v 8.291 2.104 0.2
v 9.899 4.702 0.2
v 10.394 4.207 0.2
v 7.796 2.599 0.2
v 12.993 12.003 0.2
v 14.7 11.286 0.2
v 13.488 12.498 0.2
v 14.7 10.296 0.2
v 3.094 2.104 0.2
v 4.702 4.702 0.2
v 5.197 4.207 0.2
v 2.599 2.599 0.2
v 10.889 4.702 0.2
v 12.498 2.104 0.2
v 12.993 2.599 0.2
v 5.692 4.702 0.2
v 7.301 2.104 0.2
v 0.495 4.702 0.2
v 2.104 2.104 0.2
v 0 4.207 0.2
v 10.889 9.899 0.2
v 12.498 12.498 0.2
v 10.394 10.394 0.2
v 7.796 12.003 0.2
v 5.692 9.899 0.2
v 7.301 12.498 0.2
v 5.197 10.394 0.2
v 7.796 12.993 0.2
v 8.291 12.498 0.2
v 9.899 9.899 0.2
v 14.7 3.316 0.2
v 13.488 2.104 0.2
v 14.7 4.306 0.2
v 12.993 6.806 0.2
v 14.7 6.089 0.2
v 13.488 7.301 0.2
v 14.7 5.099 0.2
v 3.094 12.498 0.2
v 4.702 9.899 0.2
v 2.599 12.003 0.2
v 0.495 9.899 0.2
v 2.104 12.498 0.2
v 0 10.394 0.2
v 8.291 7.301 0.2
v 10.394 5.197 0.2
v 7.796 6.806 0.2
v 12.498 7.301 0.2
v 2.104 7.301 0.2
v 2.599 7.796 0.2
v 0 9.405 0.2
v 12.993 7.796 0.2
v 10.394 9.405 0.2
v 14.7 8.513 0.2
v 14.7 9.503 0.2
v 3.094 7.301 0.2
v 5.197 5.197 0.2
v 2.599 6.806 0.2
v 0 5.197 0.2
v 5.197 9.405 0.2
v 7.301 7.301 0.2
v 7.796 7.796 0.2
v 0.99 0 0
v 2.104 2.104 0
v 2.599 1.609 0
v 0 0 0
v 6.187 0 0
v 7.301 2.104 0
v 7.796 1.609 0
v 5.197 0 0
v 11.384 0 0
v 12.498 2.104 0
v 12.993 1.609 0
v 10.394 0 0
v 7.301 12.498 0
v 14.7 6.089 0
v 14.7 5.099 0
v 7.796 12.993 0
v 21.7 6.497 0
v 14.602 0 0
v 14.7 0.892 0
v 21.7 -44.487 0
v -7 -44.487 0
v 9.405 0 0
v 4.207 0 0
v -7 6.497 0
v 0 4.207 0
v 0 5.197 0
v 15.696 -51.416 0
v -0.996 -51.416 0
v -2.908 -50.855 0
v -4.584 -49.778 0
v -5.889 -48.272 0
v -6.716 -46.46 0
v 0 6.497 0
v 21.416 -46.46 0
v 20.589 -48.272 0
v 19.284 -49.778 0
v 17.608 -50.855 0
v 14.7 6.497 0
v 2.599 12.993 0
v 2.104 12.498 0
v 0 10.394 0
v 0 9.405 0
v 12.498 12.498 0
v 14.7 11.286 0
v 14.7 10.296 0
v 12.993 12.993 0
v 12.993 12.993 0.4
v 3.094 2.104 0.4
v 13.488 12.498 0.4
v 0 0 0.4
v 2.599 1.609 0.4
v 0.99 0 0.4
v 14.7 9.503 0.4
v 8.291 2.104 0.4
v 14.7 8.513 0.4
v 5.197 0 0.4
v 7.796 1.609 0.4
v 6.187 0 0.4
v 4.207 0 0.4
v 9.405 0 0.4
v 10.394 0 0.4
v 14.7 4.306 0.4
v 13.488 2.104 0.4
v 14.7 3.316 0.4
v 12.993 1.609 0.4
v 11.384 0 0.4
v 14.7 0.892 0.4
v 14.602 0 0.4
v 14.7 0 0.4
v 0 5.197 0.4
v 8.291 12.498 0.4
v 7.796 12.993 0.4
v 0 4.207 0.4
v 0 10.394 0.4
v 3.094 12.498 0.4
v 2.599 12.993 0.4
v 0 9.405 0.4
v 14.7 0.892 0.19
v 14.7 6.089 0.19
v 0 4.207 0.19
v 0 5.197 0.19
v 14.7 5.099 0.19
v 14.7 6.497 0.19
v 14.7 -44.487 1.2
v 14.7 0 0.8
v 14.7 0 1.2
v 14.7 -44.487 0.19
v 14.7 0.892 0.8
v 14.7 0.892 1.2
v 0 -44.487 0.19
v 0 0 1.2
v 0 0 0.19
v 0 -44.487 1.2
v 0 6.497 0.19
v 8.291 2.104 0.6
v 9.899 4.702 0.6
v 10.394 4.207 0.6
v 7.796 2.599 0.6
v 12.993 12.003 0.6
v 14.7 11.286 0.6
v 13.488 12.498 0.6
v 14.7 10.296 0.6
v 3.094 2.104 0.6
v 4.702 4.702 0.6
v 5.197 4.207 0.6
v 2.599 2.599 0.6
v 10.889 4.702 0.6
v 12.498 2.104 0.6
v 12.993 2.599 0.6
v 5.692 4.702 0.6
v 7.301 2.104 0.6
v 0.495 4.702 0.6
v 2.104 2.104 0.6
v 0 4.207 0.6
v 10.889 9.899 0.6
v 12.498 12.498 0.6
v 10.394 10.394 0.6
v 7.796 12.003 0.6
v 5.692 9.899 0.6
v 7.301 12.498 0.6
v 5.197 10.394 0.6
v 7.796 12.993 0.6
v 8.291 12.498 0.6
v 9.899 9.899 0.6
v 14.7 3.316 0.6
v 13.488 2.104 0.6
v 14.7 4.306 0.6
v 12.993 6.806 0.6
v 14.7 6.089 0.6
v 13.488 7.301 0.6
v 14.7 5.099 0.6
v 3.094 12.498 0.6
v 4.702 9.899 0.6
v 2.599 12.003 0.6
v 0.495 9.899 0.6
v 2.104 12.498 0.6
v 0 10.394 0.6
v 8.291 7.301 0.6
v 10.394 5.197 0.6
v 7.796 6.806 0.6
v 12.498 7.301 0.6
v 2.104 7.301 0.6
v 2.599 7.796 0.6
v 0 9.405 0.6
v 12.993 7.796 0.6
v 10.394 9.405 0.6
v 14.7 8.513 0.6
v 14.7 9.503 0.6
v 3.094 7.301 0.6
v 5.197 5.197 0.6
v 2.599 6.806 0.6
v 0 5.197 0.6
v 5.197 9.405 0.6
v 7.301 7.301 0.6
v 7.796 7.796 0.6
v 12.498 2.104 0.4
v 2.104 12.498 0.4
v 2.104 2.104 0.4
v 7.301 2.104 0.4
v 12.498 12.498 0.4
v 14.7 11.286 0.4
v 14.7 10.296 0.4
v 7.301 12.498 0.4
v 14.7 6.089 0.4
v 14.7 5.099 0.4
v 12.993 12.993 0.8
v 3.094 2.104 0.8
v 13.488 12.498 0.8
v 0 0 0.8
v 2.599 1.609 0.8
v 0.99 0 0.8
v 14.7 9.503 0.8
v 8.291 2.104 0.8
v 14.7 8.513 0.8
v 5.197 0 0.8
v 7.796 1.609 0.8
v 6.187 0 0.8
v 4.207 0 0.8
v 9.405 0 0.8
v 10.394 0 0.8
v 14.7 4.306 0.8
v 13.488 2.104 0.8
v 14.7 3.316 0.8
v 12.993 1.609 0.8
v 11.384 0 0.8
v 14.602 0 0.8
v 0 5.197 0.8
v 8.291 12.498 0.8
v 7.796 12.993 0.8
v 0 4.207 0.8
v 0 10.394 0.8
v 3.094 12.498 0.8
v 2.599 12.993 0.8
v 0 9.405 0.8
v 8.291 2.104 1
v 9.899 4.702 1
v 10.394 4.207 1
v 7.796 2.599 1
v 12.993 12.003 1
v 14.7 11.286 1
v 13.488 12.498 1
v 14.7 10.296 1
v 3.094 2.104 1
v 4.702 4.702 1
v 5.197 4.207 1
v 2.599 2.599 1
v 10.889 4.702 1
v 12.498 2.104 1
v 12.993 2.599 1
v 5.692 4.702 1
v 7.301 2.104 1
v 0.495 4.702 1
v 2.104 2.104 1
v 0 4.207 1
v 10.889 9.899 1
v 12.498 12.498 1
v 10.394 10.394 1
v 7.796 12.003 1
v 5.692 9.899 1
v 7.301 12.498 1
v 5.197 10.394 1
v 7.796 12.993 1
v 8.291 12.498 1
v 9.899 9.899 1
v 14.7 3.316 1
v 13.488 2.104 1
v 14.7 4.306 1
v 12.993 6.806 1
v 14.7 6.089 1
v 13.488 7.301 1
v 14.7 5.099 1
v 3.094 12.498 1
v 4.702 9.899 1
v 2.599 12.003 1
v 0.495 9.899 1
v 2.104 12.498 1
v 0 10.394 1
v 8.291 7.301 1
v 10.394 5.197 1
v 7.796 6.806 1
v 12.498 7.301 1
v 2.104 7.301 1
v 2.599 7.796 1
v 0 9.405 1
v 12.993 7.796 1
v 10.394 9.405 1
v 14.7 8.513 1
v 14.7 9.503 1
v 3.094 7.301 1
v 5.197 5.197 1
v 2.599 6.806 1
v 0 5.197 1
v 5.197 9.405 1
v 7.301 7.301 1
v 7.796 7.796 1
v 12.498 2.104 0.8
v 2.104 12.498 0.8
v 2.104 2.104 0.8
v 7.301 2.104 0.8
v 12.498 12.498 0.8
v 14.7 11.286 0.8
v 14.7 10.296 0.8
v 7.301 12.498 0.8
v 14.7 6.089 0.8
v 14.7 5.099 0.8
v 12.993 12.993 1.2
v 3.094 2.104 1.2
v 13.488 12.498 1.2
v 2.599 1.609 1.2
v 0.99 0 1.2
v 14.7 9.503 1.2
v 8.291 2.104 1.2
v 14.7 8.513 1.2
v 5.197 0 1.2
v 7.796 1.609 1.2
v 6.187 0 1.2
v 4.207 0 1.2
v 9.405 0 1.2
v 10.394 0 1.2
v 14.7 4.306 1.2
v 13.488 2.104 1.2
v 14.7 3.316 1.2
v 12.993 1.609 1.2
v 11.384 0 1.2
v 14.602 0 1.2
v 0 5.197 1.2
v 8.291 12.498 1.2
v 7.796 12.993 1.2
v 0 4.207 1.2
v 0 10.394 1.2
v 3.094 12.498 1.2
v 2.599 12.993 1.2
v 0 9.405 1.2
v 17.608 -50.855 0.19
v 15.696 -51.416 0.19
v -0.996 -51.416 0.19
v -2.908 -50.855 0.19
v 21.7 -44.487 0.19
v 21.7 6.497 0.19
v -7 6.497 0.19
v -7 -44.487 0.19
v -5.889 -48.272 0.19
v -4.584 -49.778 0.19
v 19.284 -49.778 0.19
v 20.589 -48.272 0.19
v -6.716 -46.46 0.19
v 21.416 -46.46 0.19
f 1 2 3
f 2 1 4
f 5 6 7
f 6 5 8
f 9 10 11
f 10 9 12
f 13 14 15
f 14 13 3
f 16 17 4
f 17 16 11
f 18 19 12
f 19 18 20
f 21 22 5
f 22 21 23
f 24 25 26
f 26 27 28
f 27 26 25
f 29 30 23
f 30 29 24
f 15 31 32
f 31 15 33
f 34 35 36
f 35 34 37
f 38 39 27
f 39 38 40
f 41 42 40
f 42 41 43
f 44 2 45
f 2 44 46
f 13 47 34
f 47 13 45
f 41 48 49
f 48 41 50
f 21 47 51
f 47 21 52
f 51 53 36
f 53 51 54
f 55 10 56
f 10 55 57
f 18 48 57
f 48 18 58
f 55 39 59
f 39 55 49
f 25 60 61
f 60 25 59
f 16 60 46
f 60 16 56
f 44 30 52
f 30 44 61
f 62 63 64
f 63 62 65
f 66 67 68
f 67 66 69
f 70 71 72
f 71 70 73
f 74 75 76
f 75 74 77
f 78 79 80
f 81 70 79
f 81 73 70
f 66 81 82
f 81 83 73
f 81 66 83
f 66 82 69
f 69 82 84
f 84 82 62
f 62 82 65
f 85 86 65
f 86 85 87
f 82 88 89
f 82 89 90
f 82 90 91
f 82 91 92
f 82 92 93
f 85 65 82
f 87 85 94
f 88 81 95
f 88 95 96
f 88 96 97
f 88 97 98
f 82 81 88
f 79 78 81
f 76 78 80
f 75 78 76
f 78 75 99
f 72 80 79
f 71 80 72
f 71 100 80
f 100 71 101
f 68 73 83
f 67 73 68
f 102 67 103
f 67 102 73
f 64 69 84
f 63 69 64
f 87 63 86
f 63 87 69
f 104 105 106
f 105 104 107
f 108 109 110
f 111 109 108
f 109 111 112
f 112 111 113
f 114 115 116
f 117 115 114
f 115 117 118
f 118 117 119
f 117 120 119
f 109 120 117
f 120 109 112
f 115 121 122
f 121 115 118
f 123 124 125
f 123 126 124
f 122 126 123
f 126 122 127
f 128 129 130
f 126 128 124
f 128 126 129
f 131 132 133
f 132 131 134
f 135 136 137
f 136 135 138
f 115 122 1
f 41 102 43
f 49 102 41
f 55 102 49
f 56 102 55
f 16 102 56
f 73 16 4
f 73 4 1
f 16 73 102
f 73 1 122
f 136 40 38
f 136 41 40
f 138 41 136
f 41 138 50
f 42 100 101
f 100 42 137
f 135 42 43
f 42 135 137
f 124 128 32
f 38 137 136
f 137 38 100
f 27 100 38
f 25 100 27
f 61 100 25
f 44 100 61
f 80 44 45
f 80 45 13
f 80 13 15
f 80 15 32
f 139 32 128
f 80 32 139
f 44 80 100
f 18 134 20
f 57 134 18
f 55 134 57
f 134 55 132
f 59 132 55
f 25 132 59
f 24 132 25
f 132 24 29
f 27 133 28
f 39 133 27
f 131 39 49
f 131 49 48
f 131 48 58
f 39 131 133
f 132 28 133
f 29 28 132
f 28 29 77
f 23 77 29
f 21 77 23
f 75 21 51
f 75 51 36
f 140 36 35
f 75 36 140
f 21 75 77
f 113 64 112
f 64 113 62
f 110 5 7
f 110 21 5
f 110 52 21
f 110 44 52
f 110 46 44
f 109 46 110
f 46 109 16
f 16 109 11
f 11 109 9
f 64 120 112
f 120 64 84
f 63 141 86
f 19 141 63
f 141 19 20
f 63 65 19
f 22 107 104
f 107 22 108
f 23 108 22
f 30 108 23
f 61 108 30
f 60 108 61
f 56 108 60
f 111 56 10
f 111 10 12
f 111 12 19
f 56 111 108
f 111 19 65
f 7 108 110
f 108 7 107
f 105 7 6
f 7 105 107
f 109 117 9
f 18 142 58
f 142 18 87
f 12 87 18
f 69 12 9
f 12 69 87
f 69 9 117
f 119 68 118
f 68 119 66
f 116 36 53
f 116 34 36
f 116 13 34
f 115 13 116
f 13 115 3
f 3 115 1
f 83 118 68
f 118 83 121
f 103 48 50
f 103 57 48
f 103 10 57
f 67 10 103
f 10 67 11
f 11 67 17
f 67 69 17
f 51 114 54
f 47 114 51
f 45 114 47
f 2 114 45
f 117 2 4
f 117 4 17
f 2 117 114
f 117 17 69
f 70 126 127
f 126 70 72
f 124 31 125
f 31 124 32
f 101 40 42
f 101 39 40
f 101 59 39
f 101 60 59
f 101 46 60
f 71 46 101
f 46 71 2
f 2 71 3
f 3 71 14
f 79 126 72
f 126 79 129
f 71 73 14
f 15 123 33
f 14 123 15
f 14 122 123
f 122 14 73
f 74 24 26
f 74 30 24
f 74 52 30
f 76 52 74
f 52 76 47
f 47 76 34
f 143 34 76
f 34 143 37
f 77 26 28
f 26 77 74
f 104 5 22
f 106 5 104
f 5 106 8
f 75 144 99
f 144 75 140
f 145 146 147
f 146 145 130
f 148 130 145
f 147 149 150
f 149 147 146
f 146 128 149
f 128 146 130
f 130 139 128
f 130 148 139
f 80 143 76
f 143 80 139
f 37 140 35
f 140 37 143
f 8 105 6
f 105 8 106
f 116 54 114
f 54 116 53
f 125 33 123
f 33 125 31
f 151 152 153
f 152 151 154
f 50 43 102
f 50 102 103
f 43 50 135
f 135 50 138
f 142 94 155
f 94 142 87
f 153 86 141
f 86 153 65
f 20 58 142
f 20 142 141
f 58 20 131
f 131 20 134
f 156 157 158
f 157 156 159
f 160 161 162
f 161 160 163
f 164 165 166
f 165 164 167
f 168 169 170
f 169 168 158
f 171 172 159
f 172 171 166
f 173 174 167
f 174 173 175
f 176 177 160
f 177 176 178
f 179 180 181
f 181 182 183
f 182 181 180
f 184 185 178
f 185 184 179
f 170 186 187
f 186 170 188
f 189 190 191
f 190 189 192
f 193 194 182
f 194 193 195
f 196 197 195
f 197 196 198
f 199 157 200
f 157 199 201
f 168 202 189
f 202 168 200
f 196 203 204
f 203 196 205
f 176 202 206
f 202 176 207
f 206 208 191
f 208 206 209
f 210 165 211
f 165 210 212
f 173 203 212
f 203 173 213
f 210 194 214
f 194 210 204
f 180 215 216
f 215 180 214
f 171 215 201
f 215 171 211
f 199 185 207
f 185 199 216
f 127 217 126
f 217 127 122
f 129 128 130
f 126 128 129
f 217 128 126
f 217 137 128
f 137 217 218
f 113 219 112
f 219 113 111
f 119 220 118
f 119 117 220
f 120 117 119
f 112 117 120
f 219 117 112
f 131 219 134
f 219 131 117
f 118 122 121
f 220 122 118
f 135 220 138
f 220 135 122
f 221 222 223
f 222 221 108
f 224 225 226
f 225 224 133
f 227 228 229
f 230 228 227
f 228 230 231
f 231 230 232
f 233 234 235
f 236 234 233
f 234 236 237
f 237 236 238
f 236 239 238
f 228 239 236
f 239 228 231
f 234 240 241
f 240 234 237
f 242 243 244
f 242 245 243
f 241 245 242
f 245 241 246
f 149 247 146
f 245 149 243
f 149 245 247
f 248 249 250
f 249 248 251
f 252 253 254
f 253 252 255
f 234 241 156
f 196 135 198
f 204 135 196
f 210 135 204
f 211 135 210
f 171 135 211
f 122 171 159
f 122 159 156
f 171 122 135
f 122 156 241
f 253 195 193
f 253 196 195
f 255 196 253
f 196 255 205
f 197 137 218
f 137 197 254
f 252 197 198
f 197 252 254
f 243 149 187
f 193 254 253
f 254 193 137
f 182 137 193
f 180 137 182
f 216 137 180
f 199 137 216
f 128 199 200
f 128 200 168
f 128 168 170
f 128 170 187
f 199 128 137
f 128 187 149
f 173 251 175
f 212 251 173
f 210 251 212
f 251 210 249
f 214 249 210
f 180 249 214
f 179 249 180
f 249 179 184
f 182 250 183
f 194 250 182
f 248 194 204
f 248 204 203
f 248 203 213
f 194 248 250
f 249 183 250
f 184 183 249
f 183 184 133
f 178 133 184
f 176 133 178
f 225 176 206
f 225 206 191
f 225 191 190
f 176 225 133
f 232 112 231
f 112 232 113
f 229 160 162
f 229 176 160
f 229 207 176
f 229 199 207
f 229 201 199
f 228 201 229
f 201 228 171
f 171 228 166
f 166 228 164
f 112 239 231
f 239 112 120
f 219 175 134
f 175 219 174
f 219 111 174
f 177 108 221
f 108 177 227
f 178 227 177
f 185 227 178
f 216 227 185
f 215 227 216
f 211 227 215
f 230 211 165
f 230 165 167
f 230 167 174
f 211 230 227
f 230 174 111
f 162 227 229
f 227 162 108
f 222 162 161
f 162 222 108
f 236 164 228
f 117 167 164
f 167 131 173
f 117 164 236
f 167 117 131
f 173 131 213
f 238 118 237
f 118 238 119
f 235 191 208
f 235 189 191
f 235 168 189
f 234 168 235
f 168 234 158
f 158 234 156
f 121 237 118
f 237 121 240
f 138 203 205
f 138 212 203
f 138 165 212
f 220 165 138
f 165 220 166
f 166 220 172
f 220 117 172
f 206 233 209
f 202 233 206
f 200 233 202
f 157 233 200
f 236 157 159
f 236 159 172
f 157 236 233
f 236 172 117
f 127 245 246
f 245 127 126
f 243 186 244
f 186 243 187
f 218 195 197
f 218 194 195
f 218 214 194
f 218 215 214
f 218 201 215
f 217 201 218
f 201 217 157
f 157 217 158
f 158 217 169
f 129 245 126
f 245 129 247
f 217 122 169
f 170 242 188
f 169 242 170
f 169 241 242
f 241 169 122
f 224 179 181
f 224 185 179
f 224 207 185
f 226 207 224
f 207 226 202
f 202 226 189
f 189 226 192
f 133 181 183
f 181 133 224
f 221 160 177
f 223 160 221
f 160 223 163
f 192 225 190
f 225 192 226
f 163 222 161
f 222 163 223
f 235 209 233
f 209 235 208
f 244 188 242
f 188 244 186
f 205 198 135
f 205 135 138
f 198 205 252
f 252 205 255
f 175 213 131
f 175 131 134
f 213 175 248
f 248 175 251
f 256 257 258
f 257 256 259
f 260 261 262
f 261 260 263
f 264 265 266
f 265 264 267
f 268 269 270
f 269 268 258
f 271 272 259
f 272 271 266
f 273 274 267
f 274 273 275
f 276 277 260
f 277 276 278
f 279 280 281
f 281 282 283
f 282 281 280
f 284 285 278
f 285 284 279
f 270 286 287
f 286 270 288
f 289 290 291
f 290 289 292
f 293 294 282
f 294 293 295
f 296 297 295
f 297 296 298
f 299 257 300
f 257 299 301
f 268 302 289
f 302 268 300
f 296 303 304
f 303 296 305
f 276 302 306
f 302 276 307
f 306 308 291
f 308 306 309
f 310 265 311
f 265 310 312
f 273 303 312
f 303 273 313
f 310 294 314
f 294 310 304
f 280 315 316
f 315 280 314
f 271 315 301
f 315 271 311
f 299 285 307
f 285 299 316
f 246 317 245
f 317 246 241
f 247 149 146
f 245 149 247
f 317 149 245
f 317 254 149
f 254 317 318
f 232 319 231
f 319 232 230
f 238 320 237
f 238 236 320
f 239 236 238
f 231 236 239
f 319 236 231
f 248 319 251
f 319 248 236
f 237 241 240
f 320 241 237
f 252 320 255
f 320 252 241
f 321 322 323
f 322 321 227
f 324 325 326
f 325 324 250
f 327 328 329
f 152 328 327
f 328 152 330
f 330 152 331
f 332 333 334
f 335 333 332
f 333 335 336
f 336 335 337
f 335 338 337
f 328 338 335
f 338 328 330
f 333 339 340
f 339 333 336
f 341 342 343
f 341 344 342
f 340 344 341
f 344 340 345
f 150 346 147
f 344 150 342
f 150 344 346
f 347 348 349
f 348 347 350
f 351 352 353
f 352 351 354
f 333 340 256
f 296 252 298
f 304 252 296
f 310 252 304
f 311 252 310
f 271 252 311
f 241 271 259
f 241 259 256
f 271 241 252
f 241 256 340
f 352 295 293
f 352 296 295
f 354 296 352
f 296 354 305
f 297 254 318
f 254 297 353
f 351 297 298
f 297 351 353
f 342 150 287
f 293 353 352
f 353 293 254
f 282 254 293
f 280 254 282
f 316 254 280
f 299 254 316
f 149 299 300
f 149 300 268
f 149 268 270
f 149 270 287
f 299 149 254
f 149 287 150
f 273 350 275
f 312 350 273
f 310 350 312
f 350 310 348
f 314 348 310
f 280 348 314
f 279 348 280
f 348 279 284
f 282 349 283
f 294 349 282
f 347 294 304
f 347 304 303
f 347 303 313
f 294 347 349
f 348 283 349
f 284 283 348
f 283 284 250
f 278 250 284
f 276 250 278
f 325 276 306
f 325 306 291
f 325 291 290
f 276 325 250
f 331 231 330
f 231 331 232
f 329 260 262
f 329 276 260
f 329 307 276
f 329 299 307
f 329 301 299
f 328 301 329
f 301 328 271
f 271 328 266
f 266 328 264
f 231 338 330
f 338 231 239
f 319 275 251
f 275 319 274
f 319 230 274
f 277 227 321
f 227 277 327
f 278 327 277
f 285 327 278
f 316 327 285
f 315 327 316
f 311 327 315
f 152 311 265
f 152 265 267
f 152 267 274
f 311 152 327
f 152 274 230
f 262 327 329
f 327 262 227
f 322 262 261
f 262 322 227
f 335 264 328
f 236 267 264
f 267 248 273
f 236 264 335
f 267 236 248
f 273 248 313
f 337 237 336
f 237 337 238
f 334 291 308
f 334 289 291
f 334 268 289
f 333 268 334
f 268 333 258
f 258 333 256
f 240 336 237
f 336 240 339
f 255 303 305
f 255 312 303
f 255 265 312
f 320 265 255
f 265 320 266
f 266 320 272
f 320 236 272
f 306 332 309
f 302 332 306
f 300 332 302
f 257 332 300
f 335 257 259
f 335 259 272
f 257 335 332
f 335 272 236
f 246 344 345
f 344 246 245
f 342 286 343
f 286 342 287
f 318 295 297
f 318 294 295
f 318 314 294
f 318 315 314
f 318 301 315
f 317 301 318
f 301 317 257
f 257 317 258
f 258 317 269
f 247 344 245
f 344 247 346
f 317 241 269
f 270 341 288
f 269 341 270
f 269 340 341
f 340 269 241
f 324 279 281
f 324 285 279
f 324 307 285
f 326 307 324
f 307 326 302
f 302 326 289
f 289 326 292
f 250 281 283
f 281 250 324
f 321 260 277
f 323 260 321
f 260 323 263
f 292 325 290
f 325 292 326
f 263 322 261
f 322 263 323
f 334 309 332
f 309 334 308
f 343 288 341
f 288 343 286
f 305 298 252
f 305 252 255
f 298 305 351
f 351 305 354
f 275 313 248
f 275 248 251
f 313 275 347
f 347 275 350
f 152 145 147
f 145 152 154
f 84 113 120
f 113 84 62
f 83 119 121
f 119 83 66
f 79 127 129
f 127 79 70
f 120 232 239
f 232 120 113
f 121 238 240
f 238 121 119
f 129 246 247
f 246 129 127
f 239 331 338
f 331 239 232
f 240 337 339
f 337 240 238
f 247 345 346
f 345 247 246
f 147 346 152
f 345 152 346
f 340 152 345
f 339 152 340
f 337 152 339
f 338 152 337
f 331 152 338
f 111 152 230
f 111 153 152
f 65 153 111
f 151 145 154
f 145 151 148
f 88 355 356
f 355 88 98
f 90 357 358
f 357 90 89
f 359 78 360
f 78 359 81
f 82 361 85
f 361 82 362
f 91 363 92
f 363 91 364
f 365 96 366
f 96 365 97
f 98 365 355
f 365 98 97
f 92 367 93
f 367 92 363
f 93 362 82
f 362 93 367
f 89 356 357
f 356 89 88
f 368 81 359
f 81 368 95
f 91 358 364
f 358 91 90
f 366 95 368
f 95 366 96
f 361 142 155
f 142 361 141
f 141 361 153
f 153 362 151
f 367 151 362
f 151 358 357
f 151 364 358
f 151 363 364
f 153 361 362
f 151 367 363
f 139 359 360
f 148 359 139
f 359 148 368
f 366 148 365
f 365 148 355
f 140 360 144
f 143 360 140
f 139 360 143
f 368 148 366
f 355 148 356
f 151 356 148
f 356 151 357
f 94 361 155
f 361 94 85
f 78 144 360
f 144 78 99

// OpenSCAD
pla_w = 0.35 * 2;
pp_w = pla_w * 4.25;// 0.38 * 2;
tot_w = pla_w + pp_w;

h = 0.2;

rep = 3; // repetitions

d_rep = round(sqrt(2)*rep) + 2;

pattern_l = .5 * sqrt(2) * (tot_w * (d_rep - 1));

echo(pattern_l);

// approx dimensions of total bar
hh_=1;
ww_=15;
ll_=50;


finger_l = rep * tot_w;

n = round(ww_/tot_w); // numbre of fingers
ww = n*tot_w;
layer_count = round(hh_ / h / 2);
hh = layer_count * 2 * h;
ll = ll_ - finger_l / 2;


brim_h = 0.19;
brim_w = 7;

module layer()
{
    // fingers
    for (i = [0:n-1])
        translate([i * tot_w,0,0]) cube([pla_w, finger_l, h]);

    // beams
    for (i = [0:rep-1])
        translate([0,i*tot_w + pla_w,h]) cube([ww, pla_w, h]);
}

module brim_pla(l=finger_l)
{
    hull()
    {
        translate([0,-ll,0]) cylinder(r=brim_w, h = brim_h);
        translate([ww,-ll,0]) cylinder(r=brim_w, h = brim_h);
        translate([-brim_w, -10,0]) cube([ww+brim_w*2, 10, brim_h]);
    }
    translate([-brim_w,0,0]) cube([brim_w, l/2,brim_h]);
    translate([ww,0,0]) cube([brim_w, l/2,brim_h]);
}

module brim_pp(l=finger_l)
{
    translate([ww,l,0]) rotate([0,0,180]) brim_pla(l);
}

module pla()
{
    for (i = [0:layer_count-1])
        translate([0,0,i*2*h]) layer();
    translate([0,-ll,0]) cube([ww,ll,hh]);
}

module pp()
{
    difference()
    {
        translate([0,.0001,0]) cube([ww-.0001,ll + finger_l,hh-.0001]);
        pla();
    }
}


module diag_interlock()
{
    intersection()
    {
        translate([0,-sqrt(2)*pla_w,0])
        rotate([0,0,45])
        for (y = [-4:10])
        {
            translate([y*tot_w, -y*tot_w,0]) cube([pla_w, tot_w * d_rep - pp_w,h]);
            translate([y*tot_w, -y*tot_w,0]) cube([tot_w, pla_w,h]);
            translate([y*tot_w, -y*tot_w,h]) cube([tot_w * d_rep - pp_w,pla_w, h]);
            translate([y*tot_w, -y*tot_w,h]) cube([pla_w, tot_w,h]);
        }
        translate([0,-1,0]) cube([ww,20,hh]);
    }
}

module pla_diag()
{
    for (i = [0:layer_count-1])
        translate([0,0,i*2*h]) diag_interlock();

    translate([0,-ll,0]) cube([ww,ll,hh]);
}


module pp_diag()
{
    difference()
    {
        translate([0,.0001,0]) cube([ww-.0001,ll + pattern_l,hh-.0001]);
        pla_diag();
    }
}

color([1,0,0]) pla_diag();
color([1,0,0]) brim_pla(pattern_l);

// ignore WARNING. Just hit F6 to render, cause F5 doesn't work
*color([0,1,0]) pp_diag();
*color([0,1,0]) brim_pp(pattern_l);


//pla();
